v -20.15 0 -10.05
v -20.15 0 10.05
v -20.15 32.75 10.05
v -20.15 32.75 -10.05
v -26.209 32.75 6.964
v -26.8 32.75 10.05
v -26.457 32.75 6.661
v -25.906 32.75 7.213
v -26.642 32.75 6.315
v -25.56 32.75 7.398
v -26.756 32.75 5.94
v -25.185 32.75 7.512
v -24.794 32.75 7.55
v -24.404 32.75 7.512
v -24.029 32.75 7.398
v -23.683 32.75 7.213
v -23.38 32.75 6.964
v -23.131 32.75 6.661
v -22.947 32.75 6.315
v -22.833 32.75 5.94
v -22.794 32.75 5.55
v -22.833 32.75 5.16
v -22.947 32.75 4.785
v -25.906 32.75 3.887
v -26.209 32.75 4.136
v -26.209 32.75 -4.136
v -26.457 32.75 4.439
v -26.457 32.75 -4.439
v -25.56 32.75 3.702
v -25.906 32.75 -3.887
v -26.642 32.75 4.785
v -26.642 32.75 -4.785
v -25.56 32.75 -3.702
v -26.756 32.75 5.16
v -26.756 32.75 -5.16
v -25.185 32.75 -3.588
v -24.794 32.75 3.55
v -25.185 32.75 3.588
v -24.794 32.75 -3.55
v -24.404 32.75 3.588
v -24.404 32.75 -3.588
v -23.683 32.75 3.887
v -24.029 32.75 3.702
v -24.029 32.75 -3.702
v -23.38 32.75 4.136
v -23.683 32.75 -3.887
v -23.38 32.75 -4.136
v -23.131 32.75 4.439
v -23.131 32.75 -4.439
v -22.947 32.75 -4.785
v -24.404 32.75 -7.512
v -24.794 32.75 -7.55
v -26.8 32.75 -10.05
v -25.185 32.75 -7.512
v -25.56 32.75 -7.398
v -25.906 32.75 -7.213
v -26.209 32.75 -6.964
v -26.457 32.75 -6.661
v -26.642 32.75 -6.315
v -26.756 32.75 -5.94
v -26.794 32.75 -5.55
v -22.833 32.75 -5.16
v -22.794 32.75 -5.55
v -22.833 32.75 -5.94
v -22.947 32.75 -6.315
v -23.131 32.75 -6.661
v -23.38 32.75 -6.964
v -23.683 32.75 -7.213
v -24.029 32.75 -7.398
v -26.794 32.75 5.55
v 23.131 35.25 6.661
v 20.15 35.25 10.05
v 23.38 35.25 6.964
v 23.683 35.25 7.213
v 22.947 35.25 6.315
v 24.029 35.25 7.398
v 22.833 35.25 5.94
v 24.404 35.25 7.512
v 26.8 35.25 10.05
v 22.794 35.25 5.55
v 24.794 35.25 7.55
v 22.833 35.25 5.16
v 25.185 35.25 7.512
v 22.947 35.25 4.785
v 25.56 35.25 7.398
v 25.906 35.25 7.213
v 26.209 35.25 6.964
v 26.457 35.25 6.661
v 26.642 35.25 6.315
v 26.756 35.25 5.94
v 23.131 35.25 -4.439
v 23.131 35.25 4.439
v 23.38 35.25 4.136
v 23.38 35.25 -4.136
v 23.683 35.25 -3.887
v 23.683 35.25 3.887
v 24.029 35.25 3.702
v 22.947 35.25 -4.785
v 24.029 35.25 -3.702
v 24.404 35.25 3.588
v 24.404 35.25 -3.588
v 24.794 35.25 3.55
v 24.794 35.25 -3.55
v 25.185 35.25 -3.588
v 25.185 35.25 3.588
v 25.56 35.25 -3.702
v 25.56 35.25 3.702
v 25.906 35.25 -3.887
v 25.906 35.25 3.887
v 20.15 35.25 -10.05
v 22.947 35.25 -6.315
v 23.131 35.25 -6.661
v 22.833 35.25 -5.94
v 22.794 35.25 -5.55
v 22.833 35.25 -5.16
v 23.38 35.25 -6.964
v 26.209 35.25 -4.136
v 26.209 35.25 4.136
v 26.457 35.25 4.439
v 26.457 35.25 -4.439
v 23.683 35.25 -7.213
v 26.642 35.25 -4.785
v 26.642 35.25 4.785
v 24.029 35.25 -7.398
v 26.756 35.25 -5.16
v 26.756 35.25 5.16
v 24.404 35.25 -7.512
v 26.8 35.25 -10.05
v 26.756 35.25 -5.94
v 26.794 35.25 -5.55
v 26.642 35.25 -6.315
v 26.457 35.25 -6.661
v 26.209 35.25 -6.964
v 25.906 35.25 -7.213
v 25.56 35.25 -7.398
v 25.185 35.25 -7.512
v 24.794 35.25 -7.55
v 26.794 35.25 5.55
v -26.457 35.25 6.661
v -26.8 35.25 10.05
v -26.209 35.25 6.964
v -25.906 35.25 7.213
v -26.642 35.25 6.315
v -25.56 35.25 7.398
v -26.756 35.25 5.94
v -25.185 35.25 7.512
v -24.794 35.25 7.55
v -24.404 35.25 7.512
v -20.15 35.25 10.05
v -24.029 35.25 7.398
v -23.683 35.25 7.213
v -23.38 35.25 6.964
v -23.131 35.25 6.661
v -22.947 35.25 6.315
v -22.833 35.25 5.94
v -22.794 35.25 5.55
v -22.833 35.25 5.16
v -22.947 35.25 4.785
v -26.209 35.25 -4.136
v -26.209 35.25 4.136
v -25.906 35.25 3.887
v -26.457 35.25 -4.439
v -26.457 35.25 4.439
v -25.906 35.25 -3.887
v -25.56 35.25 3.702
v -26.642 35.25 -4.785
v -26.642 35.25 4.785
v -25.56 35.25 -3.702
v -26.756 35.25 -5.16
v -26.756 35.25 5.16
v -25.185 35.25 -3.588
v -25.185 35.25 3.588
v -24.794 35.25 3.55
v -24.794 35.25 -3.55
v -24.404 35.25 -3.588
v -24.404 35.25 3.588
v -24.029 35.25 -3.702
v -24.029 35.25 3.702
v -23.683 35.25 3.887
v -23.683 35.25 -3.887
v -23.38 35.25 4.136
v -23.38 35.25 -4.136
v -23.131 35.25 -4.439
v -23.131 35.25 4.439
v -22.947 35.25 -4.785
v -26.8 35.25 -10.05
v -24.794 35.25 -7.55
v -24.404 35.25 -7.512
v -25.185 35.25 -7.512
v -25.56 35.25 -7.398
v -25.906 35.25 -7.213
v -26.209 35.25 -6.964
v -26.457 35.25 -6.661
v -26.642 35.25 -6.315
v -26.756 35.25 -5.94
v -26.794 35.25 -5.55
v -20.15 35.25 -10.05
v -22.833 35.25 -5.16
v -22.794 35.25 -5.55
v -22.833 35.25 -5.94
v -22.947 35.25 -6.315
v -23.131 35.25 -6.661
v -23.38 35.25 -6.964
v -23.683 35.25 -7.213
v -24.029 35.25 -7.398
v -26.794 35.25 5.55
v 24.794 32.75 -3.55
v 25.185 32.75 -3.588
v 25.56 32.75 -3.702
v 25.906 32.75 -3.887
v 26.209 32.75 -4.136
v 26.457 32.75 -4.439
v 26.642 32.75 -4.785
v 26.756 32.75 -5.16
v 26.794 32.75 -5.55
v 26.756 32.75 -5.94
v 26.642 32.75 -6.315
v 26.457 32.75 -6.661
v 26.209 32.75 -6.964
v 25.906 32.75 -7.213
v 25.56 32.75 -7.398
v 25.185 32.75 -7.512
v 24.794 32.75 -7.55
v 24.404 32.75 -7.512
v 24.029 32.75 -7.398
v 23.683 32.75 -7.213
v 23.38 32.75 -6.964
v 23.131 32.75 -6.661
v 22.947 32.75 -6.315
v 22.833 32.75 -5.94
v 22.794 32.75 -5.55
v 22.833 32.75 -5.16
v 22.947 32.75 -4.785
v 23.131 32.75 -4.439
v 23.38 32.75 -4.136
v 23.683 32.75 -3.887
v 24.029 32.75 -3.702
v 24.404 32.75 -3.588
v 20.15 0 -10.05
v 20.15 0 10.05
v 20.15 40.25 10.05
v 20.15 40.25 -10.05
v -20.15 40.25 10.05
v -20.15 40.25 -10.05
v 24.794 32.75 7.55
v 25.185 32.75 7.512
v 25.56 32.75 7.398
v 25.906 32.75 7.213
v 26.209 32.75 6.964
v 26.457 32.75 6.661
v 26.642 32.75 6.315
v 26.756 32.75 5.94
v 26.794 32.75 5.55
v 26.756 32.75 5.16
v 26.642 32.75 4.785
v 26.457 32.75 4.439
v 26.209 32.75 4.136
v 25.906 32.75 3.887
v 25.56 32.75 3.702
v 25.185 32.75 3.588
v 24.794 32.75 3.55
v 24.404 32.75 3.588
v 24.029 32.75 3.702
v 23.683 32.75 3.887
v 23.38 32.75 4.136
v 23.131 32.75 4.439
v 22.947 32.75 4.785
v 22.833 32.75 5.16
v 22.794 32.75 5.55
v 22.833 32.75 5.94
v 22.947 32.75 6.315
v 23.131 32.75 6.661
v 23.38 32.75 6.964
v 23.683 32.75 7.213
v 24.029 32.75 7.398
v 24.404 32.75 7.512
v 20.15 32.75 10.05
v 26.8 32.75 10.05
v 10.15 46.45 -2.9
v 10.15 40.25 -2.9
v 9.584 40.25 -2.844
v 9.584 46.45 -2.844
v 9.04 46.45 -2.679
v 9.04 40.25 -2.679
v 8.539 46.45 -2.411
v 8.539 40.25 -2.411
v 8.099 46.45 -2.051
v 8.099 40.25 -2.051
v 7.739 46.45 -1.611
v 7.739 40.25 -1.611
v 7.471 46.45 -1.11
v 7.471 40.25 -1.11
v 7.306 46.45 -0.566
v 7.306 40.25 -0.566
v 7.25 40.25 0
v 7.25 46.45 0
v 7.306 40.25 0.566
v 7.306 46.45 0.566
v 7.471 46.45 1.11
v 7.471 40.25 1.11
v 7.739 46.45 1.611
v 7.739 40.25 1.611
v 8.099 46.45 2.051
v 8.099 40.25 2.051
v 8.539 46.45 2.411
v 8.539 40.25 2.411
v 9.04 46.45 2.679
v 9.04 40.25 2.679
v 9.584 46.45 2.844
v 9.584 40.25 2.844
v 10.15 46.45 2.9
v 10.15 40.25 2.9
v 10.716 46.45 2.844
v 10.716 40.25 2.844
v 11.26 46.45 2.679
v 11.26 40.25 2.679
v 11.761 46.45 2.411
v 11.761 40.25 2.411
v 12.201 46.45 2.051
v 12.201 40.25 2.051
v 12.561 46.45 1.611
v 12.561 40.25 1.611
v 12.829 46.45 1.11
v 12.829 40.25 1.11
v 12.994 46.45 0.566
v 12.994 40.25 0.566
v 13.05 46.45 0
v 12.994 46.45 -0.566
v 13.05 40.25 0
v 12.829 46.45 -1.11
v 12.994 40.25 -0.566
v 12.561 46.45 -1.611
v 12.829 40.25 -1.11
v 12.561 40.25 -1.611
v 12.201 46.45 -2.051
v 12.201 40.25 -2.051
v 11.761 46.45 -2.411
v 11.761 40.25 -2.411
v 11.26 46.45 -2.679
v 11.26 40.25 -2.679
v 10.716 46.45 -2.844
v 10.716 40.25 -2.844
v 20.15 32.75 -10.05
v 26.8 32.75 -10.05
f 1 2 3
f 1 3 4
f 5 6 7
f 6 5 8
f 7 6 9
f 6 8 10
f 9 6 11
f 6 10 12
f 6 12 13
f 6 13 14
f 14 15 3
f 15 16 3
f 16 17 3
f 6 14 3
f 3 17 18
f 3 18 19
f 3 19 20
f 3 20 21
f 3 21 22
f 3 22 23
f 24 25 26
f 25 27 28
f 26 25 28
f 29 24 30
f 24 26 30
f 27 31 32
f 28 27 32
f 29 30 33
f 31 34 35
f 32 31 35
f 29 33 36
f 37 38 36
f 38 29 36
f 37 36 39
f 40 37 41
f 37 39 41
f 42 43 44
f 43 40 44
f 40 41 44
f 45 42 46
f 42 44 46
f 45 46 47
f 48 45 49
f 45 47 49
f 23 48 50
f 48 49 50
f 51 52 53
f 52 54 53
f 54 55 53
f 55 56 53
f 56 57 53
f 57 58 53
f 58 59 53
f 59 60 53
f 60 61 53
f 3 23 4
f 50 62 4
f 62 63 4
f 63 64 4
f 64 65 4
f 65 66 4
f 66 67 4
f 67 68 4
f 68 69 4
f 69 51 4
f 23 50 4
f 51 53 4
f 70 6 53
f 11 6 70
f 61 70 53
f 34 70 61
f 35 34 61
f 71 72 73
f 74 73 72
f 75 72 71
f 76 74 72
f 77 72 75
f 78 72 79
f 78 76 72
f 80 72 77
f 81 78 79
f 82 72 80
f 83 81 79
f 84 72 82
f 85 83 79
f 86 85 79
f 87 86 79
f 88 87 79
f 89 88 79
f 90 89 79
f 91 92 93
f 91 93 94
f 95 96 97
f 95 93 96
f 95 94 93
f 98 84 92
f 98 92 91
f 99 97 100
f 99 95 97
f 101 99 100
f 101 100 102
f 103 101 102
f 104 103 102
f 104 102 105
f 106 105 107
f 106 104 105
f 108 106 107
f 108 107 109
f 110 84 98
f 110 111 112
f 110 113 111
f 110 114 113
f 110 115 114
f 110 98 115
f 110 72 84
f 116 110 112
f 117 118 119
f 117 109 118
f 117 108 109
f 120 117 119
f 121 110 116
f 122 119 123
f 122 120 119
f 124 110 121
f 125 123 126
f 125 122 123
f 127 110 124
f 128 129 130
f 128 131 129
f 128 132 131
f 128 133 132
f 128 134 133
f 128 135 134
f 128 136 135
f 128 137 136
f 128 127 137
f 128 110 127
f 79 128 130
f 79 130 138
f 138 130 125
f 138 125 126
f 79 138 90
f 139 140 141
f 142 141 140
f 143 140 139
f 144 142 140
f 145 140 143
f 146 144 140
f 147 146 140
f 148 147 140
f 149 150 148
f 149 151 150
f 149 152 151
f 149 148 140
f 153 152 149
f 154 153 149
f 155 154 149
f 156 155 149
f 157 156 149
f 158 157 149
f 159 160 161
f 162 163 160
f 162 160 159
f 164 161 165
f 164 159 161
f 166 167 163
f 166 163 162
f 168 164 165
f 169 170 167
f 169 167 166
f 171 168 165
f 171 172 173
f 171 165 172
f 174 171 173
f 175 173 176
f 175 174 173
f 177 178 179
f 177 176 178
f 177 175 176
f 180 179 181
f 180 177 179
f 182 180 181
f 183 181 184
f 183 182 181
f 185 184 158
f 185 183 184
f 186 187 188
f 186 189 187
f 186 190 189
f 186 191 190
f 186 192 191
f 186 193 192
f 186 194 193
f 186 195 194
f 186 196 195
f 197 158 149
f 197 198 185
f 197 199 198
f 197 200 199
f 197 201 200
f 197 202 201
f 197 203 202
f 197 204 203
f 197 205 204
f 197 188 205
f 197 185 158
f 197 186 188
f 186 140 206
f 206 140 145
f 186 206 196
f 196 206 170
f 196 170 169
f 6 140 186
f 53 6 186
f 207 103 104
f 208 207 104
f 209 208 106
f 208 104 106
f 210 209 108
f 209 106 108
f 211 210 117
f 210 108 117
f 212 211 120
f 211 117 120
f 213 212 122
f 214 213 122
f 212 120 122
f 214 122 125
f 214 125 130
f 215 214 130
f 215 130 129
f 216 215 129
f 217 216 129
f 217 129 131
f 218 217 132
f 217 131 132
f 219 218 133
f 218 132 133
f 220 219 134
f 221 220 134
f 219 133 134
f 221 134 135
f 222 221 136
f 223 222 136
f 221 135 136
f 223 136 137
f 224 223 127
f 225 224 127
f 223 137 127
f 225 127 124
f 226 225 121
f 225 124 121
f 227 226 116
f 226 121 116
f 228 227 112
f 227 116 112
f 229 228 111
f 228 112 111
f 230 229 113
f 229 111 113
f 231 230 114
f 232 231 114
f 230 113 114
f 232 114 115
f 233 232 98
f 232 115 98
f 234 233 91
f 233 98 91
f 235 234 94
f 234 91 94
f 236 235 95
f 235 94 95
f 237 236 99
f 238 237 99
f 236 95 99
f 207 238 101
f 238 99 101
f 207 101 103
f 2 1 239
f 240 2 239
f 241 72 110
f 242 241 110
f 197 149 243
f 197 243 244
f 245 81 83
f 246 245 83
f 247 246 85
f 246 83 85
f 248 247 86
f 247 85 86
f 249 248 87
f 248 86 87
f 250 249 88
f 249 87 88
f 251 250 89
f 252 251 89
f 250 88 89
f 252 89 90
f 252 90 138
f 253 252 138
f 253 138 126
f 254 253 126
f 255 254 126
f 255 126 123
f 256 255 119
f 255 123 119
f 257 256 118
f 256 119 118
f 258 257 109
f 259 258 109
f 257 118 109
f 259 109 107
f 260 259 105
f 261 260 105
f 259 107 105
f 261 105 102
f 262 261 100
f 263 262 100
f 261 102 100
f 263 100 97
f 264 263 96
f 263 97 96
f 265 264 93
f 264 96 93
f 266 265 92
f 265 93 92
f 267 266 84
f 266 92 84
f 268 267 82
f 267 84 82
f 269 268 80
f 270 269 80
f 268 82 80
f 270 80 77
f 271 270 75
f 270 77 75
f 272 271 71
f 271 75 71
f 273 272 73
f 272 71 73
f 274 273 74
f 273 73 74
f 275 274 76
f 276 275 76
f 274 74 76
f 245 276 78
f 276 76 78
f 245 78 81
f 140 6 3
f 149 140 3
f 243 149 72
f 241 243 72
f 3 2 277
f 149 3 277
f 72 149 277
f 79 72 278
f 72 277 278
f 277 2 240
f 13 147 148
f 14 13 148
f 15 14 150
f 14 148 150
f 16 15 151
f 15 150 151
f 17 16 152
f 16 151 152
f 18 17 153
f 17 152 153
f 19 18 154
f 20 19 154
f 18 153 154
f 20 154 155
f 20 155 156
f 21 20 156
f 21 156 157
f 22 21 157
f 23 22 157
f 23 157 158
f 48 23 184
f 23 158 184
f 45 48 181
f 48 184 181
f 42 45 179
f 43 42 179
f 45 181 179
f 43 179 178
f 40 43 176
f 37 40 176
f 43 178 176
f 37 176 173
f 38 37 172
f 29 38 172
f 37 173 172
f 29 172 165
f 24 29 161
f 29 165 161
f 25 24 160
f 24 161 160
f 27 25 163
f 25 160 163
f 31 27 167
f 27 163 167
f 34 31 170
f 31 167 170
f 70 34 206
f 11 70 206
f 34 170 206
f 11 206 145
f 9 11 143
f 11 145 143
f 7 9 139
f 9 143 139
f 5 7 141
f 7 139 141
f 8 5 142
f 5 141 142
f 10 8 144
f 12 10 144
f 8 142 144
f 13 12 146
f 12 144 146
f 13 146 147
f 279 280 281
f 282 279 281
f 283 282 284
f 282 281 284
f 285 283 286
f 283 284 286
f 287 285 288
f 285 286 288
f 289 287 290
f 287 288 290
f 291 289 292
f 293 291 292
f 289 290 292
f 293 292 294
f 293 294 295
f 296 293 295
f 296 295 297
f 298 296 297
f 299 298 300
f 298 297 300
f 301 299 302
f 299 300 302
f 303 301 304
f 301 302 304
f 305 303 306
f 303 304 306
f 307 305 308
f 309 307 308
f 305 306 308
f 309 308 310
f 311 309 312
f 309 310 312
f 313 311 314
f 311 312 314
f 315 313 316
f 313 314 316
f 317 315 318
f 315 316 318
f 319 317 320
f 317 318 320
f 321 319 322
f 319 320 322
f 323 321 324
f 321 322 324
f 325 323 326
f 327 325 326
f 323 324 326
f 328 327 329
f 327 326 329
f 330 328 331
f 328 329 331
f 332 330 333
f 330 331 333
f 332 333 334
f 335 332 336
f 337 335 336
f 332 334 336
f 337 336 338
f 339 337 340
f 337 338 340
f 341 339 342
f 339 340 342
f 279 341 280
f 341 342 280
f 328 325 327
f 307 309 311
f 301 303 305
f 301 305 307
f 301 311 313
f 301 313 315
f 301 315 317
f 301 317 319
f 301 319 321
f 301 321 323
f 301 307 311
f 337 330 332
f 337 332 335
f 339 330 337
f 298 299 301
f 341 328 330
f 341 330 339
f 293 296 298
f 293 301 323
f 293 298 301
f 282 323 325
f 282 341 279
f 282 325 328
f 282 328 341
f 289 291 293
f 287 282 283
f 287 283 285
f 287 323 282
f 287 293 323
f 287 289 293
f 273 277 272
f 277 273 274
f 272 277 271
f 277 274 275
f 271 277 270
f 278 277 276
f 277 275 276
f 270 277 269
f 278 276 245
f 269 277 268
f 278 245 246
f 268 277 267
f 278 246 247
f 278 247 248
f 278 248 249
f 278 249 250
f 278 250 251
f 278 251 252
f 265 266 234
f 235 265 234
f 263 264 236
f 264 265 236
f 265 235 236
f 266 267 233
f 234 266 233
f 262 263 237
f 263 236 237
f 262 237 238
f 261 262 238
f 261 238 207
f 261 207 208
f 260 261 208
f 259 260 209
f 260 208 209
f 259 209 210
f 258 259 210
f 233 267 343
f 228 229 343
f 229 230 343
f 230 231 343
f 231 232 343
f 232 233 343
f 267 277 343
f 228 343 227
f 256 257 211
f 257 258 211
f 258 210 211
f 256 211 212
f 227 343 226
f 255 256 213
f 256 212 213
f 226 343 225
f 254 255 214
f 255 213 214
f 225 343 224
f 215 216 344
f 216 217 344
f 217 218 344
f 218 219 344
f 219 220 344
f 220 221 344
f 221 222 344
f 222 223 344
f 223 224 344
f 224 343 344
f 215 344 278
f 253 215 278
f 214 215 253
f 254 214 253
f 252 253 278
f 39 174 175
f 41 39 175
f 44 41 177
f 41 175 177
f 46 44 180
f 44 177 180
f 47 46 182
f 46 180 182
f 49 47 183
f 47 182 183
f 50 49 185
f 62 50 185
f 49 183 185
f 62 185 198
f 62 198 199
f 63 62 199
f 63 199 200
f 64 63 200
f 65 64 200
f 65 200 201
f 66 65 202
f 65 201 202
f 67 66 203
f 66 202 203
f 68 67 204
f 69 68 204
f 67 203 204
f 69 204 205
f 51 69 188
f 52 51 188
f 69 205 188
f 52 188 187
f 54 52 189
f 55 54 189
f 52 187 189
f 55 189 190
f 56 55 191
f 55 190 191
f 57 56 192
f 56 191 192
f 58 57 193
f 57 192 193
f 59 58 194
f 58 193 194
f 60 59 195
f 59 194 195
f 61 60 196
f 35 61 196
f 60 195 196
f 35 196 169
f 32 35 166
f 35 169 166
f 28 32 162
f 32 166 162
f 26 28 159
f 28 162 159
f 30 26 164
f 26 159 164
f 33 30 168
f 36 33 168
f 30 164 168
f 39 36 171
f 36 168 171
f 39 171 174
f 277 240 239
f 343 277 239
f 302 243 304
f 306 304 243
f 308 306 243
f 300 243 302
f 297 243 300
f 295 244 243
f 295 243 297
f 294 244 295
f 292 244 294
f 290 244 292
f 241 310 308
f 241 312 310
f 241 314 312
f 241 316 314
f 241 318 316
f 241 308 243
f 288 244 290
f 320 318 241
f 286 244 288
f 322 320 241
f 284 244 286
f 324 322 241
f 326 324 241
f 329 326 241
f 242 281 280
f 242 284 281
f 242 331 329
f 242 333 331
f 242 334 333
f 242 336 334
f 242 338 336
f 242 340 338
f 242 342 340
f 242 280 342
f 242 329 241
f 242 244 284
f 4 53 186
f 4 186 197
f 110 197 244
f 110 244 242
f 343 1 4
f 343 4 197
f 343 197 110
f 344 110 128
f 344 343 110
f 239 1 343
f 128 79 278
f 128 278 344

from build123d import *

# Parameters (mm, degrees)
SKETCH1_W           = 40.3
SKETCH1_H           = 20.1
BOSS_EXTRUDE1_DEPTH = 40.25
SKETCH2_R           = 2.9
BOSS_EXTRUDE2_DEPTH = 6.2
BOSS_EXTRUDE3_START = -5
SKETCH3_W           = 6.65
SKETCH3_H           = 20.1
SKETCH3_R           = 2
BOSS_EXTRUDE3_DEPTH = 2.5


with BuildPart() as part:
    # Sketch1 → Boss-Extrude1 (new body)
    with BuildSketch(Plane(origin=(0, 0, 0), x_dir=(1, 0, 0), z_dir=(0, 1, 0))):
        Rectangle(SKETCH1_W, SKETCH1_H)
    extrude(amount=BOSS_EXTRUDE1_DEPTH)

    # Sketch2 → Boss-Extrude2 (add)
    with BuildSketch(Plane(origin=(0, 40.25, 0), x_dir=(1, 0, 0), z_dir=(0, 1, 0))):
        with Locations(Location((10.15, 0, 0), (0, 0, 90))):
            Circle(SKETCH2_R)
    extrude(amount=BOSS_EXTRUDE2_DEPTH)

    # Sketch3 → Boss-Extrude3 (add)
    # profile 1 of 2: a face of its own
    with BuildSketch(Plane(origin=(0, 40.25, 0), x_dir=(1, 0, 0), z_dir=(0, 1, 0)).offset(BOSS_EXTRUDE3_START)):
        with Locations((-23.475, 0)):
            Rectangle(SKETCH3_W, SKETCH3_H)
        with Locations(Location((-24.794421729, 5.55, 0), (0, 0, 270))):
            Circle(SKETCH3_R, mode=Mode.SUBTRACT)
        with Locations(Location((-24.794421729, -5.55, 0), (0, 0, 270))):
            Circle(SKETCH3_R, mode=Mode.SUBTRACT)
    # profile 2 of 2: a face of its own
    with BuildSketch(Plane(origin=(0, 40.25, 0), x_dir=(1, 0, 0), z_dir=(0, 1, 0)).offset(BOSS_EXTRUDE3_START)):
        with Locations((23.475, 0)):
            Rectangle(SKETCH3_W, SKETCH3_H)
        with Locations(Location((24.794421729, -5.55, 0), (0, 0, 270))):
            Circle(SKETCH3_R, mode=Mode.SUBTRACT)
        with Locations(Location((24.794421729, 5.55, 0), (0, 0, 270))):
            Circle(SKETCH3_R, mode=Mode.SUBTRACT)
    extrude(amount=-BOSS_EXTRUDE3_DEPTH)


solid = part.part
